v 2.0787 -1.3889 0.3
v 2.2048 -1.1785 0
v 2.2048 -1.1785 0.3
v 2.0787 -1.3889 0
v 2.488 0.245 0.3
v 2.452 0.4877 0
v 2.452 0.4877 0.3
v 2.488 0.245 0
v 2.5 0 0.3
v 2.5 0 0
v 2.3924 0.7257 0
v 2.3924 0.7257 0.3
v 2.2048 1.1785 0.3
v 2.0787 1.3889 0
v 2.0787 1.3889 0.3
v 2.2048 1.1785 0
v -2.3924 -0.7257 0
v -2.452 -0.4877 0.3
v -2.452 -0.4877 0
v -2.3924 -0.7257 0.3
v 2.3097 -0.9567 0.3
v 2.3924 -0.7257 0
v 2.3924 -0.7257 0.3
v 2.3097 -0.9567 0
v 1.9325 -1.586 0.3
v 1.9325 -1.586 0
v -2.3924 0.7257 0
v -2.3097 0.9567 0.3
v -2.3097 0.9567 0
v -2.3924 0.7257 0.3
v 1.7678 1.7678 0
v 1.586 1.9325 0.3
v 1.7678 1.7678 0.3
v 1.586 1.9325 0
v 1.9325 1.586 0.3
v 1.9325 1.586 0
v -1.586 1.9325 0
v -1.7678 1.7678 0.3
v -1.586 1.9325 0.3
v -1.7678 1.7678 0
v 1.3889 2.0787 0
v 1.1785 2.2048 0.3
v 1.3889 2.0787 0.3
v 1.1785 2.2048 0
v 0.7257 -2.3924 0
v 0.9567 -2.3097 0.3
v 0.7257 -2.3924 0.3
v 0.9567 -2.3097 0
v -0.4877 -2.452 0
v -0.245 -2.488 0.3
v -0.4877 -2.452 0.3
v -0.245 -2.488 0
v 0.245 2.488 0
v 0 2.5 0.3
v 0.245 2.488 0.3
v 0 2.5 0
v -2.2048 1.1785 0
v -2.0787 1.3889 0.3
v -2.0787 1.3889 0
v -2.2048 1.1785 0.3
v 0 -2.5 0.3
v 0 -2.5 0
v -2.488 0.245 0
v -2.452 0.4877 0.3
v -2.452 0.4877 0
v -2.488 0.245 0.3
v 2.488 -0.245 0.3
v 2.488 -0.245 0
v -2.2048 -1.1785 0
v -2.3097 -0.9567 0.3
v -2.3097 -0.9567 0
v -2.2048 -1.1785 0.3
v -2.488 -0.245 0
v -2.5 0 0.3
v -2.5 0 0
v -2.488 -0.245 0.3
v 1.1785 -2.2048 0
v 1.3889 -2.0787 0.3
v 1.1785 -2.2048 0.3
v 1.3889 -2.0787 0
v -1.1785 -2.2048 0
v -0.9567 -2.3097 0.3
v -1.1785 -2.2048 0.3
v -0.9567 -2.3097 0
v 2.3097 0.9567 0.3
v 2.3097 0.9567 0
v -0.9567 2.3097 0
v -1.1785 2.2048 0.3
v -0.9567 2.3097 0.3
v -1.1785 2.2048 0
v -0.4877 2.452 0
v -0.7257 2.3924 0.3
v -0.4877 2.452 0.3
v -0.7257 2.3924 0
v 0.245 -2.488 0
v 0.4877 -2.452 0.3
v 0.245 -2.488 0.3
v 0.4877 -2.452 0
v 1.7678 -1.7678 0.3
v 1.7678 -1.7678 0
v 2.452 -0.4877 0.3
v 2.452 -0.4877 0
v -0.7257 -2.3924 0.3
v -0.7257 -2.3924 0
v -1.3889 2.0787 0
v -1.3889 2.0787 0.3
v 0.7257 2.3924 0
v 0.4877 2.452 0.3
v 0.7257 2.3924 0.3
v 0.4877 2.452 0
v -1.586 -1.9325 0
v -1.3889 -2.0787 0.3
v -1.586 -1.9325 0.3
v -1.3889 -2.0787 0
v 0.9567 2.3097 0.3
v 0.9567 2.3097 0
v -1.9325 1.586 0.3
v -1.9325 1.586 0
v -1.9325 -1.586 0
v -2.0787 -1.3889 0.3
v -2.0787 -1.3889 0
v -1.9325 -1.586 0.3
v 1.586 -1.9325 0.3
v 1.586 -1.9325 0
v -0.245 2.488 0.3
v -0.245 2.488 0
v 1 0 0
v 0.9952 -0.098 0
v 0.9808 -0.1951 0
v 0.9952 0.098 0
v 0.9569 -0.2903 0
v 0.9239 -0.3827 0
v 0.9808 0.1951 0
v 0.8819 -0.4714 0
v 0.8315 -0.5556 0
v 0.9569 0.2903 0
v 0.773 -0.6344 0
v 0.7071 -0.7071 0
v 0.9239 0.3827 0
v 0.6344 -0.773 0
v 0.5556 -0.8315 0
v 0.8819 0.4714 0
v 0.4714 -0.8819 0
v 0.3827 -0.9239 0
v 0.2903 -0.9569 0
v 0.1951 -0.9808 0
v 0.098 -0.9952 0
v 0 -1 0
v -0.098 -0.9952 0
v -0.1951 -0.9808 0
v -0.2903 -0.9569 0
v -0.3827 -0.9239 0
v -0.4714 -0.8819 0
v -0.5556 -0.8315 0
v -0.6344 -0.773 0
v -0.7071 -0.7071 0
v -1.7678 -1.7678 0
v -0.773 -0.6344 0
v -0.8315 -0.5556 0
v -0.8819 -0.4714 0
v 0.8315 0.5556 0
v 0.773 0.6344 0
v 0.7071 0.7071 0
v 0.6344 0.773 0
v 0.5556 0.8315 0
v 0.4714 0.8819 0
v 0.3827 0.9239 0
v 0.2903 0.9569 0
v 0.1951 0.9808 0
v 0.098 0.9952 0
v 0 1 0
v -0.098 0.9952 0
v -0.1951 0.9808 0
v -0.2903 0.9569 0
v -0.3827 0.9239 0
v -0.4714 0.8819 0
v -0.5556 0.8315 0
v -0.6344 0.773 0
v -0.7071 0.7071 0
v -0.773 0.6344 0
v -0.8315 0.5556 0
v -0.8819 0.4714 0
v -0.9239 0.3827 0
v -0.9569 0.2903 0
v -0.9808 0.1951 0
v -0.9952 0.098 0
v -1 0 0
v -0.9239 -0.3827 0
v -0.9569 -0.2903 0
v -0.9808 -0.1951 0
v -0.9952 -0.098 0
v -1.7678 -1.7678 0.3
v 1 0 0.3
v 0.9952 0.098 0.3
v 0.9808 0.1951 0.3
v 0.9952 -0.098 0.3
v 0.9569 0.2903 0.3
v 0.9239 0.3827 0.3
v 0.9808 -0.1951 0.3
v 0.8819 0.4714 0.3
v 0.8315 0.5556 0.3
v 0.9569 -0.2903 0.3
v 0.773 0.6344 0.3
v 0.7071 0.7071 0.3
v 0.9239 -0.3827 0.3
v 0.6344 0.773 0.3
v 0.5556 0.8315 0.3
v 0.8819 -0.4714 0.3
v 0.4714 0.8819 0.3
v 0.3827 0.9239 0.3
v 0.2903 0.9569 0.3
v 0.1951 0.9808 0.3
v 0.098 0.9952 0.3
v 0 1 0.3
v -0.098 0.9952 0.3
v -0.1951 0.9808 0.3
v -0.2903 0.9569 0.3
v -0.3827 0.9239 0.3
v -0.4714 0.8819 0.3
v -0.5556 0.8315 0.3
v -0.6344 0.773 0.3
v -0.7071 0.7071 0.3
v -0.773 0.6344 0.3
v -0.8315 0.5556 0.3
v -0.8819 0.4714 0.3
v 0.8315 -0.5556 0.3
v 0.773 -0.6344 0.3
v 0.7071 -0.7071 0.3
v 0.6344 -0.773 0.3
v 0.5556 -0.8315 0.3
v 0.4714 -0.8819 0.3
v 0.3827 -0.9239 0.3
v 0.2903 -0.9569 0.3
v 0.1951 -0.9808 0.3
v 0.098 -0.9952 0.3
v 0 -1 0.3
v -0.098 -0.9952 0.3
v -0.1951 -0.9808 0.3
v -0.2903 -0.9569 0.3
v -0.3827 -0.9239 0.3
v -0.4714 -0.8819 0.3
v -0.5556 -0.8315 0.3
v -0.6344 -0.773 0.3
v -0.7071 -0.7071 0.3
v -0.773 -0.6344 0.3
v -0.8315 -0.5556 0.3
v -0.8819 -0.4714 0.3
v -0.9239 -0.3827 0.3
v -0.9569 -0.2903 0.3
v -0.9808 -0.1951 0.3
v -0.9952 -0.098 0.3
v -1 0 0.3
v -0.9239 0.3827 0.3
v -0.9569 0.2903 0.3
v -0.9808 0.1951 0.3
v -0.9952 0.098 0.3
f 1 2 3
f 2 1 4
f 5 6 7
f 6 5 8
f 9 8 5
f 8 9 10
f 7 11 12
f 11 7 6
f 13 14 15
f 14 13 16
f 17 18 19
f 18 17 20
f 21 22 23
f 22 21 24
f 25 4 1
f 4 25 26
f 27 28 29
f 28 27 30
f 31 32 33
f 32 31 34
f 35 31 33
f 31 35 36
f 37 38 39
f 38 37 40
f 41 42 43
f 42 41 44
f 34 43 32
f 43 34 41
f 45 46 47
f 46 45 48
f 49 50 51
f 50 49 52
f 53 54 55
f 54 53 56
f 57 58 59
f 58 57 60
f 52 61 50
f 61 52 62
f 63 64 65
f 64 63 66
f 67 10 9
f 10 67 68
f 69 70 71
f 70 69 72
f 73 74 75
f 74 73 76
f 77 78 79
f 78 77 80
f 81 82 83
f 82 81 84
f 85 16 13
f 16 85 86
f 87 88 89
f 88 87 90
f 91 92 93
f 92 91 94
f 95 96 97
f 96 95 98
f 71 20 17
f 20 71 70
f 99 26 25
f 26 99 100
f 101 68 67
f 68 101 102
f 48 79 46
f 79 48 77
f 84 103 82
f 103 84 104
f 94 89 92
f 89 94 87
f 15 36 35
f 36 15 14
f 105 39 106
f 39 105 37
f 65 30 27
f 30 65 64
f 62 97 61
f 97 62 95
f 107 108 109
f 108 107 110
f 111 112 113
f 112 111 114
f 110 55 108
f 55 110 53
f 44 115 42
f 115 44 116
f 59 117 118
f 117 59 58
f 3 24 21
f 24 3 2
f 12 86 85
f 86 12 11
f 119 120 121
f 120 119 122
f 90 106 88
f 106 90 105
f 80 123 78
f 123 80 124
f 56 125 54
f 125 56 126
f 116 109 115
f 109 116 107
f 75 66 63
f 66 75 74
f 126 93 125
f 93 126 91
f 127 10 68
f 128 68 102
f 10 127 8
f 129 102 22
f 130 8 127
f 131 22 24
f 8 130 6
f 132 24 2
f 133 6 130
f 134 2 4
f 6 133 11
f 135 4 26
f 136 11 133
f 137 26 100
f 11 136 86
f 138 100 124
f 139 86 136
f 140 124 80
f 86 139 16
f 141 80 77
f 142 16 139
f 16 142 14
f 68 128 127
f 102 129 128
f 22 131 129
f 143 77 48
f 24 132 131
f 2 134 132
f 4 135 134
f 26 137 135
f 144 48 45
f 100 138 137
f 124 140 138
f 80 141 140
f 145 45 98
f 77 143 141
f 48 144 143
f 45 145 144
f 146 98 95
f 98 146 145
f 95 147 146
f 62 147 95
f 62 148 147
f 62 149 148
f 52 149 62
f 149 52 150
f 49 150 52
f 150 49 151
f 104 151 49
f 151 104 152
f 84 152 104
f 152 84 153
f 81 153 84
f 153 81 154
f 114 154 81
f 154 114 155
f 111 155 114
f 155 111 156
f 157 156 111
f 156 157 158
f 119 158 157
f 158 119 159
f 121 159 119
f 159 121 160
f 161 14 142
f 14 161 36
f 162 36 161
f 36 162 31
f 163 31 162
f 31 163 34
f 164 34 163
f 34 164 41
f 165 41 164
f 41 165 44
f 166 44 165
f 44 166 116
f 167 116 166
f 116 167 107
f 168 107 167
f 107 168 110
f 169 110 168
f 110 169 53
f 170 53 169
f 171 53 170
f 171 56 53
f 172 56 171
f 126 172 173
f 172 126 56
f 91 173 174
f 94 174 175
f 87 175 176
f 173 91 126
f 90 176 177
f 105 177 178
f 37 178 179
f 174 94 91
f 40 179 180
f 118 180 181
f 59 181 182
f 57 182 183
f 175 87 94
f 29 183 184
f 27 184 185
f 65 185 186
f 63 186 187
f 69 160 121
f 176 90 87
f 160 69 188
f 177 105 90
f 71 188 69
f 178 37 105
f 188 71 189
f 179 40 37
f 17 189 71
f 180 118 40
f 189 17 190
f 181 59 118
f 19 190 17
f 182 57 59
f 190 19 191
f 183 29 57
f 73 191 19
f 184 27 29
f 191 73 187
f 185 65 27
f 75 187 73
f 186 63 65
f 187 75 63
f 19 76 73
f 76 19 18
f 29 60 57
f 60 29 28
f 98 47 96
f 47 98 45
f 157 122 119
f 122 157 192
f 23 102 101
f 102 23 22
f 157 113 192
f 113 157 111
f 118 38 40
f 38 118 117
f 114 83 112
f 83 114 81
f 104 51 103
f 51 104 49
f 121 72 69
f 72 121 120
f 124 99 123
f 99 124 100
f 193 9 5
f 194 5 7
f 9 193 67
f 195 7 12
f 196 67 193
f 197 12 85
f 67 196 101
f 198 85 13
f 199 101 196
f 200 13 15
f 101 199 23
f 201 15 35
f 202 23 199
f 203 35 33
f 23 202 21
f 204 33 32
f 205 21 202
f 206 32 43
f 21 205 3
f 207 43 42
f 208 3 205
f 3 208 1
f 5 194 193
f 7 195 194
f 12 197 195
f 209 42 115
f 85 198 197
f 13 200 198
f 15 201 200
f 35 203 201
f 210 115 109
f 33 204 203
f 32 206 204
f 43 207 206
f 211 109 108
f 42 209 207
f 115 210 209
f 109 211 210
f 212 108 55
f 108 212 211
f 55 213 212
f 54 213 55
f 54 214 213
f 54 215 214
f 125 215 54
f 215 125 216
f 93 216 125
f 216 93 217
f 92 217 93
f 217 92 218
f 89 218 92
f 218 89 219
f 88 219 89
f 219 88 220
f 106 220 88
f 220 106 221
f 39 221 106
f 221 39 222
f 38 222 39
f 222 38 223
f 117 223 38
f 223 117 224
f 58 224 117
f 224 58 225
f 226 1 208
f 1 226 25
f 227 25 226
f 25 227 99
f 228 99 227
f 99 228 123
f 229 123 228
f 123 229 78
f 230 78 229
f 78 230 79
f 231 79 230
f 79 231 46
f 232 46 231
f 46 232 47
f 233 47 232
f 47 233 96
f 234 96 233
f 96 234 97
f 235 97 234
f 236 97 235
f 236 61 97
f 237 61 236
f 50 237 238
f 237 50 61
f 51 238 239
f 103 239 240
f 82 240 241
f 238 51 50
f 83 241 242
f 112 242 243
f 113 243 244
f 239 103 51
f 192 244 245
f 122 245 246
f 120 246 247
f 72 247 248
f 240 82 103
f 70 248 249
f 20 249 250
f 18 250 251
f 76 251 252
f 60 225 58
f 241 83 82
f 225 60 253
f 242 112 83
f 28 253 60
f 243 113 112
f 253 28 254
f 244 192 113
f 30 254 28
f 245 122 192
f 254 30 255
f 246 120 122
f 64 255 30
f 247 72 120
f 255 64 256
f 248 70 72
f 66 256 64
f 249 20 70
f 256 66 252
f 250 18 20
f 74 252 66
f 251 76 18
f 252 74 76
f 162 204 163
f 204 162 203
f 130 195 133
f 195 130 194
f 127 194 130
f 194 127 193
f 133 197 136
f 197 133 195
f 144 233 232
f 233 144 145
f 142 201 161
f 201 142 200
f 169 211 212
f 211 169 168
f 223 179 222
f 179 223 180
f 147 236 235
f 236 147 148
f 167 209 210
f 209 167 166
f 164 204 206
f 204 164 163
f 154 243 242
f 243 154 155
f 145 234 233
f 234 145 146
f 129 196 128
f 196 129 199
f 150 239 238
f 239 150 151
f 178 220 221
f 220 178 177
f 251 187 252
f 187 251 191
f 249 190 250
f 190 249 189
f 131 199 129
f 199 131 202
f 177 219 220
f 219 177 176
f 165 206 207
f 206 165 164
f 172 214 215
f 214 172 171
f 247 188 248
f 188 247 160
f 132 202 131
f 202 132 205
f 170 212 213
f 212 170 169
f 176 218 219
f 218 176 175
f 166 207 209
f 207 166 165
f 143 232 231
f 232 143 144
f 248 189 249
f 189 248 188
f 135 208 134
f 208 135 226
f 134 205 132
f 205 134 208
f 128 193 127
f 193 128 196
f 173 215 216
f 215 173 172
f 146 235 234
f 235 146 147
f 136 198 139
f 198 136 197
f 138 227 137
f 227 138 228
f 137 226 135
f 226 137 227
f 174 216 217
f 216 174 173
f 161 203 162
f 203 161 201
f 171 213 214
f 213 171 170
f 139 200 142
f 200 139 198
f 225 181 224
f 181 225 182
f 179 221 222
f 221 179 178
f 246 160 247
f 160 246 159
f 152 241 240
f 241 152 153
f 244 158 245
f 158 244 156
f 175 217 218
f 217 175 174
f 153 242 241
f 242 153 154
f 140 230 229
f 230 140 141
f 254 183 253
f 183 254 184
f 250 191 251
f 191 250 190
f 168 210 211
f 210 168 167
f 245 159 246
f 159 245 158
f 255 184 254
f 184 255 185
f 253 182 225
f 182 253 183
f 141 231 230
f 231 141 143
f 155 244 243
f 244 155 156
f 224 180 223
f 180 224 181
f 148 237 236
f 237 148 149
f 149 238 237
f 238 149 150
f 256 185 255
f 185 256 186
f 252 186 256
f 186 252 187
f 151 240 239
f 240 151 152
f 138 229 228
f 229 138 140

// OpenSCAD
difference() {
    cylinder(h=0.3, d=5.0, $fn=64);
    translate([0, 0, -0.1])
        cylinder(h=0.5, d=2.0, $fn=64);
}
